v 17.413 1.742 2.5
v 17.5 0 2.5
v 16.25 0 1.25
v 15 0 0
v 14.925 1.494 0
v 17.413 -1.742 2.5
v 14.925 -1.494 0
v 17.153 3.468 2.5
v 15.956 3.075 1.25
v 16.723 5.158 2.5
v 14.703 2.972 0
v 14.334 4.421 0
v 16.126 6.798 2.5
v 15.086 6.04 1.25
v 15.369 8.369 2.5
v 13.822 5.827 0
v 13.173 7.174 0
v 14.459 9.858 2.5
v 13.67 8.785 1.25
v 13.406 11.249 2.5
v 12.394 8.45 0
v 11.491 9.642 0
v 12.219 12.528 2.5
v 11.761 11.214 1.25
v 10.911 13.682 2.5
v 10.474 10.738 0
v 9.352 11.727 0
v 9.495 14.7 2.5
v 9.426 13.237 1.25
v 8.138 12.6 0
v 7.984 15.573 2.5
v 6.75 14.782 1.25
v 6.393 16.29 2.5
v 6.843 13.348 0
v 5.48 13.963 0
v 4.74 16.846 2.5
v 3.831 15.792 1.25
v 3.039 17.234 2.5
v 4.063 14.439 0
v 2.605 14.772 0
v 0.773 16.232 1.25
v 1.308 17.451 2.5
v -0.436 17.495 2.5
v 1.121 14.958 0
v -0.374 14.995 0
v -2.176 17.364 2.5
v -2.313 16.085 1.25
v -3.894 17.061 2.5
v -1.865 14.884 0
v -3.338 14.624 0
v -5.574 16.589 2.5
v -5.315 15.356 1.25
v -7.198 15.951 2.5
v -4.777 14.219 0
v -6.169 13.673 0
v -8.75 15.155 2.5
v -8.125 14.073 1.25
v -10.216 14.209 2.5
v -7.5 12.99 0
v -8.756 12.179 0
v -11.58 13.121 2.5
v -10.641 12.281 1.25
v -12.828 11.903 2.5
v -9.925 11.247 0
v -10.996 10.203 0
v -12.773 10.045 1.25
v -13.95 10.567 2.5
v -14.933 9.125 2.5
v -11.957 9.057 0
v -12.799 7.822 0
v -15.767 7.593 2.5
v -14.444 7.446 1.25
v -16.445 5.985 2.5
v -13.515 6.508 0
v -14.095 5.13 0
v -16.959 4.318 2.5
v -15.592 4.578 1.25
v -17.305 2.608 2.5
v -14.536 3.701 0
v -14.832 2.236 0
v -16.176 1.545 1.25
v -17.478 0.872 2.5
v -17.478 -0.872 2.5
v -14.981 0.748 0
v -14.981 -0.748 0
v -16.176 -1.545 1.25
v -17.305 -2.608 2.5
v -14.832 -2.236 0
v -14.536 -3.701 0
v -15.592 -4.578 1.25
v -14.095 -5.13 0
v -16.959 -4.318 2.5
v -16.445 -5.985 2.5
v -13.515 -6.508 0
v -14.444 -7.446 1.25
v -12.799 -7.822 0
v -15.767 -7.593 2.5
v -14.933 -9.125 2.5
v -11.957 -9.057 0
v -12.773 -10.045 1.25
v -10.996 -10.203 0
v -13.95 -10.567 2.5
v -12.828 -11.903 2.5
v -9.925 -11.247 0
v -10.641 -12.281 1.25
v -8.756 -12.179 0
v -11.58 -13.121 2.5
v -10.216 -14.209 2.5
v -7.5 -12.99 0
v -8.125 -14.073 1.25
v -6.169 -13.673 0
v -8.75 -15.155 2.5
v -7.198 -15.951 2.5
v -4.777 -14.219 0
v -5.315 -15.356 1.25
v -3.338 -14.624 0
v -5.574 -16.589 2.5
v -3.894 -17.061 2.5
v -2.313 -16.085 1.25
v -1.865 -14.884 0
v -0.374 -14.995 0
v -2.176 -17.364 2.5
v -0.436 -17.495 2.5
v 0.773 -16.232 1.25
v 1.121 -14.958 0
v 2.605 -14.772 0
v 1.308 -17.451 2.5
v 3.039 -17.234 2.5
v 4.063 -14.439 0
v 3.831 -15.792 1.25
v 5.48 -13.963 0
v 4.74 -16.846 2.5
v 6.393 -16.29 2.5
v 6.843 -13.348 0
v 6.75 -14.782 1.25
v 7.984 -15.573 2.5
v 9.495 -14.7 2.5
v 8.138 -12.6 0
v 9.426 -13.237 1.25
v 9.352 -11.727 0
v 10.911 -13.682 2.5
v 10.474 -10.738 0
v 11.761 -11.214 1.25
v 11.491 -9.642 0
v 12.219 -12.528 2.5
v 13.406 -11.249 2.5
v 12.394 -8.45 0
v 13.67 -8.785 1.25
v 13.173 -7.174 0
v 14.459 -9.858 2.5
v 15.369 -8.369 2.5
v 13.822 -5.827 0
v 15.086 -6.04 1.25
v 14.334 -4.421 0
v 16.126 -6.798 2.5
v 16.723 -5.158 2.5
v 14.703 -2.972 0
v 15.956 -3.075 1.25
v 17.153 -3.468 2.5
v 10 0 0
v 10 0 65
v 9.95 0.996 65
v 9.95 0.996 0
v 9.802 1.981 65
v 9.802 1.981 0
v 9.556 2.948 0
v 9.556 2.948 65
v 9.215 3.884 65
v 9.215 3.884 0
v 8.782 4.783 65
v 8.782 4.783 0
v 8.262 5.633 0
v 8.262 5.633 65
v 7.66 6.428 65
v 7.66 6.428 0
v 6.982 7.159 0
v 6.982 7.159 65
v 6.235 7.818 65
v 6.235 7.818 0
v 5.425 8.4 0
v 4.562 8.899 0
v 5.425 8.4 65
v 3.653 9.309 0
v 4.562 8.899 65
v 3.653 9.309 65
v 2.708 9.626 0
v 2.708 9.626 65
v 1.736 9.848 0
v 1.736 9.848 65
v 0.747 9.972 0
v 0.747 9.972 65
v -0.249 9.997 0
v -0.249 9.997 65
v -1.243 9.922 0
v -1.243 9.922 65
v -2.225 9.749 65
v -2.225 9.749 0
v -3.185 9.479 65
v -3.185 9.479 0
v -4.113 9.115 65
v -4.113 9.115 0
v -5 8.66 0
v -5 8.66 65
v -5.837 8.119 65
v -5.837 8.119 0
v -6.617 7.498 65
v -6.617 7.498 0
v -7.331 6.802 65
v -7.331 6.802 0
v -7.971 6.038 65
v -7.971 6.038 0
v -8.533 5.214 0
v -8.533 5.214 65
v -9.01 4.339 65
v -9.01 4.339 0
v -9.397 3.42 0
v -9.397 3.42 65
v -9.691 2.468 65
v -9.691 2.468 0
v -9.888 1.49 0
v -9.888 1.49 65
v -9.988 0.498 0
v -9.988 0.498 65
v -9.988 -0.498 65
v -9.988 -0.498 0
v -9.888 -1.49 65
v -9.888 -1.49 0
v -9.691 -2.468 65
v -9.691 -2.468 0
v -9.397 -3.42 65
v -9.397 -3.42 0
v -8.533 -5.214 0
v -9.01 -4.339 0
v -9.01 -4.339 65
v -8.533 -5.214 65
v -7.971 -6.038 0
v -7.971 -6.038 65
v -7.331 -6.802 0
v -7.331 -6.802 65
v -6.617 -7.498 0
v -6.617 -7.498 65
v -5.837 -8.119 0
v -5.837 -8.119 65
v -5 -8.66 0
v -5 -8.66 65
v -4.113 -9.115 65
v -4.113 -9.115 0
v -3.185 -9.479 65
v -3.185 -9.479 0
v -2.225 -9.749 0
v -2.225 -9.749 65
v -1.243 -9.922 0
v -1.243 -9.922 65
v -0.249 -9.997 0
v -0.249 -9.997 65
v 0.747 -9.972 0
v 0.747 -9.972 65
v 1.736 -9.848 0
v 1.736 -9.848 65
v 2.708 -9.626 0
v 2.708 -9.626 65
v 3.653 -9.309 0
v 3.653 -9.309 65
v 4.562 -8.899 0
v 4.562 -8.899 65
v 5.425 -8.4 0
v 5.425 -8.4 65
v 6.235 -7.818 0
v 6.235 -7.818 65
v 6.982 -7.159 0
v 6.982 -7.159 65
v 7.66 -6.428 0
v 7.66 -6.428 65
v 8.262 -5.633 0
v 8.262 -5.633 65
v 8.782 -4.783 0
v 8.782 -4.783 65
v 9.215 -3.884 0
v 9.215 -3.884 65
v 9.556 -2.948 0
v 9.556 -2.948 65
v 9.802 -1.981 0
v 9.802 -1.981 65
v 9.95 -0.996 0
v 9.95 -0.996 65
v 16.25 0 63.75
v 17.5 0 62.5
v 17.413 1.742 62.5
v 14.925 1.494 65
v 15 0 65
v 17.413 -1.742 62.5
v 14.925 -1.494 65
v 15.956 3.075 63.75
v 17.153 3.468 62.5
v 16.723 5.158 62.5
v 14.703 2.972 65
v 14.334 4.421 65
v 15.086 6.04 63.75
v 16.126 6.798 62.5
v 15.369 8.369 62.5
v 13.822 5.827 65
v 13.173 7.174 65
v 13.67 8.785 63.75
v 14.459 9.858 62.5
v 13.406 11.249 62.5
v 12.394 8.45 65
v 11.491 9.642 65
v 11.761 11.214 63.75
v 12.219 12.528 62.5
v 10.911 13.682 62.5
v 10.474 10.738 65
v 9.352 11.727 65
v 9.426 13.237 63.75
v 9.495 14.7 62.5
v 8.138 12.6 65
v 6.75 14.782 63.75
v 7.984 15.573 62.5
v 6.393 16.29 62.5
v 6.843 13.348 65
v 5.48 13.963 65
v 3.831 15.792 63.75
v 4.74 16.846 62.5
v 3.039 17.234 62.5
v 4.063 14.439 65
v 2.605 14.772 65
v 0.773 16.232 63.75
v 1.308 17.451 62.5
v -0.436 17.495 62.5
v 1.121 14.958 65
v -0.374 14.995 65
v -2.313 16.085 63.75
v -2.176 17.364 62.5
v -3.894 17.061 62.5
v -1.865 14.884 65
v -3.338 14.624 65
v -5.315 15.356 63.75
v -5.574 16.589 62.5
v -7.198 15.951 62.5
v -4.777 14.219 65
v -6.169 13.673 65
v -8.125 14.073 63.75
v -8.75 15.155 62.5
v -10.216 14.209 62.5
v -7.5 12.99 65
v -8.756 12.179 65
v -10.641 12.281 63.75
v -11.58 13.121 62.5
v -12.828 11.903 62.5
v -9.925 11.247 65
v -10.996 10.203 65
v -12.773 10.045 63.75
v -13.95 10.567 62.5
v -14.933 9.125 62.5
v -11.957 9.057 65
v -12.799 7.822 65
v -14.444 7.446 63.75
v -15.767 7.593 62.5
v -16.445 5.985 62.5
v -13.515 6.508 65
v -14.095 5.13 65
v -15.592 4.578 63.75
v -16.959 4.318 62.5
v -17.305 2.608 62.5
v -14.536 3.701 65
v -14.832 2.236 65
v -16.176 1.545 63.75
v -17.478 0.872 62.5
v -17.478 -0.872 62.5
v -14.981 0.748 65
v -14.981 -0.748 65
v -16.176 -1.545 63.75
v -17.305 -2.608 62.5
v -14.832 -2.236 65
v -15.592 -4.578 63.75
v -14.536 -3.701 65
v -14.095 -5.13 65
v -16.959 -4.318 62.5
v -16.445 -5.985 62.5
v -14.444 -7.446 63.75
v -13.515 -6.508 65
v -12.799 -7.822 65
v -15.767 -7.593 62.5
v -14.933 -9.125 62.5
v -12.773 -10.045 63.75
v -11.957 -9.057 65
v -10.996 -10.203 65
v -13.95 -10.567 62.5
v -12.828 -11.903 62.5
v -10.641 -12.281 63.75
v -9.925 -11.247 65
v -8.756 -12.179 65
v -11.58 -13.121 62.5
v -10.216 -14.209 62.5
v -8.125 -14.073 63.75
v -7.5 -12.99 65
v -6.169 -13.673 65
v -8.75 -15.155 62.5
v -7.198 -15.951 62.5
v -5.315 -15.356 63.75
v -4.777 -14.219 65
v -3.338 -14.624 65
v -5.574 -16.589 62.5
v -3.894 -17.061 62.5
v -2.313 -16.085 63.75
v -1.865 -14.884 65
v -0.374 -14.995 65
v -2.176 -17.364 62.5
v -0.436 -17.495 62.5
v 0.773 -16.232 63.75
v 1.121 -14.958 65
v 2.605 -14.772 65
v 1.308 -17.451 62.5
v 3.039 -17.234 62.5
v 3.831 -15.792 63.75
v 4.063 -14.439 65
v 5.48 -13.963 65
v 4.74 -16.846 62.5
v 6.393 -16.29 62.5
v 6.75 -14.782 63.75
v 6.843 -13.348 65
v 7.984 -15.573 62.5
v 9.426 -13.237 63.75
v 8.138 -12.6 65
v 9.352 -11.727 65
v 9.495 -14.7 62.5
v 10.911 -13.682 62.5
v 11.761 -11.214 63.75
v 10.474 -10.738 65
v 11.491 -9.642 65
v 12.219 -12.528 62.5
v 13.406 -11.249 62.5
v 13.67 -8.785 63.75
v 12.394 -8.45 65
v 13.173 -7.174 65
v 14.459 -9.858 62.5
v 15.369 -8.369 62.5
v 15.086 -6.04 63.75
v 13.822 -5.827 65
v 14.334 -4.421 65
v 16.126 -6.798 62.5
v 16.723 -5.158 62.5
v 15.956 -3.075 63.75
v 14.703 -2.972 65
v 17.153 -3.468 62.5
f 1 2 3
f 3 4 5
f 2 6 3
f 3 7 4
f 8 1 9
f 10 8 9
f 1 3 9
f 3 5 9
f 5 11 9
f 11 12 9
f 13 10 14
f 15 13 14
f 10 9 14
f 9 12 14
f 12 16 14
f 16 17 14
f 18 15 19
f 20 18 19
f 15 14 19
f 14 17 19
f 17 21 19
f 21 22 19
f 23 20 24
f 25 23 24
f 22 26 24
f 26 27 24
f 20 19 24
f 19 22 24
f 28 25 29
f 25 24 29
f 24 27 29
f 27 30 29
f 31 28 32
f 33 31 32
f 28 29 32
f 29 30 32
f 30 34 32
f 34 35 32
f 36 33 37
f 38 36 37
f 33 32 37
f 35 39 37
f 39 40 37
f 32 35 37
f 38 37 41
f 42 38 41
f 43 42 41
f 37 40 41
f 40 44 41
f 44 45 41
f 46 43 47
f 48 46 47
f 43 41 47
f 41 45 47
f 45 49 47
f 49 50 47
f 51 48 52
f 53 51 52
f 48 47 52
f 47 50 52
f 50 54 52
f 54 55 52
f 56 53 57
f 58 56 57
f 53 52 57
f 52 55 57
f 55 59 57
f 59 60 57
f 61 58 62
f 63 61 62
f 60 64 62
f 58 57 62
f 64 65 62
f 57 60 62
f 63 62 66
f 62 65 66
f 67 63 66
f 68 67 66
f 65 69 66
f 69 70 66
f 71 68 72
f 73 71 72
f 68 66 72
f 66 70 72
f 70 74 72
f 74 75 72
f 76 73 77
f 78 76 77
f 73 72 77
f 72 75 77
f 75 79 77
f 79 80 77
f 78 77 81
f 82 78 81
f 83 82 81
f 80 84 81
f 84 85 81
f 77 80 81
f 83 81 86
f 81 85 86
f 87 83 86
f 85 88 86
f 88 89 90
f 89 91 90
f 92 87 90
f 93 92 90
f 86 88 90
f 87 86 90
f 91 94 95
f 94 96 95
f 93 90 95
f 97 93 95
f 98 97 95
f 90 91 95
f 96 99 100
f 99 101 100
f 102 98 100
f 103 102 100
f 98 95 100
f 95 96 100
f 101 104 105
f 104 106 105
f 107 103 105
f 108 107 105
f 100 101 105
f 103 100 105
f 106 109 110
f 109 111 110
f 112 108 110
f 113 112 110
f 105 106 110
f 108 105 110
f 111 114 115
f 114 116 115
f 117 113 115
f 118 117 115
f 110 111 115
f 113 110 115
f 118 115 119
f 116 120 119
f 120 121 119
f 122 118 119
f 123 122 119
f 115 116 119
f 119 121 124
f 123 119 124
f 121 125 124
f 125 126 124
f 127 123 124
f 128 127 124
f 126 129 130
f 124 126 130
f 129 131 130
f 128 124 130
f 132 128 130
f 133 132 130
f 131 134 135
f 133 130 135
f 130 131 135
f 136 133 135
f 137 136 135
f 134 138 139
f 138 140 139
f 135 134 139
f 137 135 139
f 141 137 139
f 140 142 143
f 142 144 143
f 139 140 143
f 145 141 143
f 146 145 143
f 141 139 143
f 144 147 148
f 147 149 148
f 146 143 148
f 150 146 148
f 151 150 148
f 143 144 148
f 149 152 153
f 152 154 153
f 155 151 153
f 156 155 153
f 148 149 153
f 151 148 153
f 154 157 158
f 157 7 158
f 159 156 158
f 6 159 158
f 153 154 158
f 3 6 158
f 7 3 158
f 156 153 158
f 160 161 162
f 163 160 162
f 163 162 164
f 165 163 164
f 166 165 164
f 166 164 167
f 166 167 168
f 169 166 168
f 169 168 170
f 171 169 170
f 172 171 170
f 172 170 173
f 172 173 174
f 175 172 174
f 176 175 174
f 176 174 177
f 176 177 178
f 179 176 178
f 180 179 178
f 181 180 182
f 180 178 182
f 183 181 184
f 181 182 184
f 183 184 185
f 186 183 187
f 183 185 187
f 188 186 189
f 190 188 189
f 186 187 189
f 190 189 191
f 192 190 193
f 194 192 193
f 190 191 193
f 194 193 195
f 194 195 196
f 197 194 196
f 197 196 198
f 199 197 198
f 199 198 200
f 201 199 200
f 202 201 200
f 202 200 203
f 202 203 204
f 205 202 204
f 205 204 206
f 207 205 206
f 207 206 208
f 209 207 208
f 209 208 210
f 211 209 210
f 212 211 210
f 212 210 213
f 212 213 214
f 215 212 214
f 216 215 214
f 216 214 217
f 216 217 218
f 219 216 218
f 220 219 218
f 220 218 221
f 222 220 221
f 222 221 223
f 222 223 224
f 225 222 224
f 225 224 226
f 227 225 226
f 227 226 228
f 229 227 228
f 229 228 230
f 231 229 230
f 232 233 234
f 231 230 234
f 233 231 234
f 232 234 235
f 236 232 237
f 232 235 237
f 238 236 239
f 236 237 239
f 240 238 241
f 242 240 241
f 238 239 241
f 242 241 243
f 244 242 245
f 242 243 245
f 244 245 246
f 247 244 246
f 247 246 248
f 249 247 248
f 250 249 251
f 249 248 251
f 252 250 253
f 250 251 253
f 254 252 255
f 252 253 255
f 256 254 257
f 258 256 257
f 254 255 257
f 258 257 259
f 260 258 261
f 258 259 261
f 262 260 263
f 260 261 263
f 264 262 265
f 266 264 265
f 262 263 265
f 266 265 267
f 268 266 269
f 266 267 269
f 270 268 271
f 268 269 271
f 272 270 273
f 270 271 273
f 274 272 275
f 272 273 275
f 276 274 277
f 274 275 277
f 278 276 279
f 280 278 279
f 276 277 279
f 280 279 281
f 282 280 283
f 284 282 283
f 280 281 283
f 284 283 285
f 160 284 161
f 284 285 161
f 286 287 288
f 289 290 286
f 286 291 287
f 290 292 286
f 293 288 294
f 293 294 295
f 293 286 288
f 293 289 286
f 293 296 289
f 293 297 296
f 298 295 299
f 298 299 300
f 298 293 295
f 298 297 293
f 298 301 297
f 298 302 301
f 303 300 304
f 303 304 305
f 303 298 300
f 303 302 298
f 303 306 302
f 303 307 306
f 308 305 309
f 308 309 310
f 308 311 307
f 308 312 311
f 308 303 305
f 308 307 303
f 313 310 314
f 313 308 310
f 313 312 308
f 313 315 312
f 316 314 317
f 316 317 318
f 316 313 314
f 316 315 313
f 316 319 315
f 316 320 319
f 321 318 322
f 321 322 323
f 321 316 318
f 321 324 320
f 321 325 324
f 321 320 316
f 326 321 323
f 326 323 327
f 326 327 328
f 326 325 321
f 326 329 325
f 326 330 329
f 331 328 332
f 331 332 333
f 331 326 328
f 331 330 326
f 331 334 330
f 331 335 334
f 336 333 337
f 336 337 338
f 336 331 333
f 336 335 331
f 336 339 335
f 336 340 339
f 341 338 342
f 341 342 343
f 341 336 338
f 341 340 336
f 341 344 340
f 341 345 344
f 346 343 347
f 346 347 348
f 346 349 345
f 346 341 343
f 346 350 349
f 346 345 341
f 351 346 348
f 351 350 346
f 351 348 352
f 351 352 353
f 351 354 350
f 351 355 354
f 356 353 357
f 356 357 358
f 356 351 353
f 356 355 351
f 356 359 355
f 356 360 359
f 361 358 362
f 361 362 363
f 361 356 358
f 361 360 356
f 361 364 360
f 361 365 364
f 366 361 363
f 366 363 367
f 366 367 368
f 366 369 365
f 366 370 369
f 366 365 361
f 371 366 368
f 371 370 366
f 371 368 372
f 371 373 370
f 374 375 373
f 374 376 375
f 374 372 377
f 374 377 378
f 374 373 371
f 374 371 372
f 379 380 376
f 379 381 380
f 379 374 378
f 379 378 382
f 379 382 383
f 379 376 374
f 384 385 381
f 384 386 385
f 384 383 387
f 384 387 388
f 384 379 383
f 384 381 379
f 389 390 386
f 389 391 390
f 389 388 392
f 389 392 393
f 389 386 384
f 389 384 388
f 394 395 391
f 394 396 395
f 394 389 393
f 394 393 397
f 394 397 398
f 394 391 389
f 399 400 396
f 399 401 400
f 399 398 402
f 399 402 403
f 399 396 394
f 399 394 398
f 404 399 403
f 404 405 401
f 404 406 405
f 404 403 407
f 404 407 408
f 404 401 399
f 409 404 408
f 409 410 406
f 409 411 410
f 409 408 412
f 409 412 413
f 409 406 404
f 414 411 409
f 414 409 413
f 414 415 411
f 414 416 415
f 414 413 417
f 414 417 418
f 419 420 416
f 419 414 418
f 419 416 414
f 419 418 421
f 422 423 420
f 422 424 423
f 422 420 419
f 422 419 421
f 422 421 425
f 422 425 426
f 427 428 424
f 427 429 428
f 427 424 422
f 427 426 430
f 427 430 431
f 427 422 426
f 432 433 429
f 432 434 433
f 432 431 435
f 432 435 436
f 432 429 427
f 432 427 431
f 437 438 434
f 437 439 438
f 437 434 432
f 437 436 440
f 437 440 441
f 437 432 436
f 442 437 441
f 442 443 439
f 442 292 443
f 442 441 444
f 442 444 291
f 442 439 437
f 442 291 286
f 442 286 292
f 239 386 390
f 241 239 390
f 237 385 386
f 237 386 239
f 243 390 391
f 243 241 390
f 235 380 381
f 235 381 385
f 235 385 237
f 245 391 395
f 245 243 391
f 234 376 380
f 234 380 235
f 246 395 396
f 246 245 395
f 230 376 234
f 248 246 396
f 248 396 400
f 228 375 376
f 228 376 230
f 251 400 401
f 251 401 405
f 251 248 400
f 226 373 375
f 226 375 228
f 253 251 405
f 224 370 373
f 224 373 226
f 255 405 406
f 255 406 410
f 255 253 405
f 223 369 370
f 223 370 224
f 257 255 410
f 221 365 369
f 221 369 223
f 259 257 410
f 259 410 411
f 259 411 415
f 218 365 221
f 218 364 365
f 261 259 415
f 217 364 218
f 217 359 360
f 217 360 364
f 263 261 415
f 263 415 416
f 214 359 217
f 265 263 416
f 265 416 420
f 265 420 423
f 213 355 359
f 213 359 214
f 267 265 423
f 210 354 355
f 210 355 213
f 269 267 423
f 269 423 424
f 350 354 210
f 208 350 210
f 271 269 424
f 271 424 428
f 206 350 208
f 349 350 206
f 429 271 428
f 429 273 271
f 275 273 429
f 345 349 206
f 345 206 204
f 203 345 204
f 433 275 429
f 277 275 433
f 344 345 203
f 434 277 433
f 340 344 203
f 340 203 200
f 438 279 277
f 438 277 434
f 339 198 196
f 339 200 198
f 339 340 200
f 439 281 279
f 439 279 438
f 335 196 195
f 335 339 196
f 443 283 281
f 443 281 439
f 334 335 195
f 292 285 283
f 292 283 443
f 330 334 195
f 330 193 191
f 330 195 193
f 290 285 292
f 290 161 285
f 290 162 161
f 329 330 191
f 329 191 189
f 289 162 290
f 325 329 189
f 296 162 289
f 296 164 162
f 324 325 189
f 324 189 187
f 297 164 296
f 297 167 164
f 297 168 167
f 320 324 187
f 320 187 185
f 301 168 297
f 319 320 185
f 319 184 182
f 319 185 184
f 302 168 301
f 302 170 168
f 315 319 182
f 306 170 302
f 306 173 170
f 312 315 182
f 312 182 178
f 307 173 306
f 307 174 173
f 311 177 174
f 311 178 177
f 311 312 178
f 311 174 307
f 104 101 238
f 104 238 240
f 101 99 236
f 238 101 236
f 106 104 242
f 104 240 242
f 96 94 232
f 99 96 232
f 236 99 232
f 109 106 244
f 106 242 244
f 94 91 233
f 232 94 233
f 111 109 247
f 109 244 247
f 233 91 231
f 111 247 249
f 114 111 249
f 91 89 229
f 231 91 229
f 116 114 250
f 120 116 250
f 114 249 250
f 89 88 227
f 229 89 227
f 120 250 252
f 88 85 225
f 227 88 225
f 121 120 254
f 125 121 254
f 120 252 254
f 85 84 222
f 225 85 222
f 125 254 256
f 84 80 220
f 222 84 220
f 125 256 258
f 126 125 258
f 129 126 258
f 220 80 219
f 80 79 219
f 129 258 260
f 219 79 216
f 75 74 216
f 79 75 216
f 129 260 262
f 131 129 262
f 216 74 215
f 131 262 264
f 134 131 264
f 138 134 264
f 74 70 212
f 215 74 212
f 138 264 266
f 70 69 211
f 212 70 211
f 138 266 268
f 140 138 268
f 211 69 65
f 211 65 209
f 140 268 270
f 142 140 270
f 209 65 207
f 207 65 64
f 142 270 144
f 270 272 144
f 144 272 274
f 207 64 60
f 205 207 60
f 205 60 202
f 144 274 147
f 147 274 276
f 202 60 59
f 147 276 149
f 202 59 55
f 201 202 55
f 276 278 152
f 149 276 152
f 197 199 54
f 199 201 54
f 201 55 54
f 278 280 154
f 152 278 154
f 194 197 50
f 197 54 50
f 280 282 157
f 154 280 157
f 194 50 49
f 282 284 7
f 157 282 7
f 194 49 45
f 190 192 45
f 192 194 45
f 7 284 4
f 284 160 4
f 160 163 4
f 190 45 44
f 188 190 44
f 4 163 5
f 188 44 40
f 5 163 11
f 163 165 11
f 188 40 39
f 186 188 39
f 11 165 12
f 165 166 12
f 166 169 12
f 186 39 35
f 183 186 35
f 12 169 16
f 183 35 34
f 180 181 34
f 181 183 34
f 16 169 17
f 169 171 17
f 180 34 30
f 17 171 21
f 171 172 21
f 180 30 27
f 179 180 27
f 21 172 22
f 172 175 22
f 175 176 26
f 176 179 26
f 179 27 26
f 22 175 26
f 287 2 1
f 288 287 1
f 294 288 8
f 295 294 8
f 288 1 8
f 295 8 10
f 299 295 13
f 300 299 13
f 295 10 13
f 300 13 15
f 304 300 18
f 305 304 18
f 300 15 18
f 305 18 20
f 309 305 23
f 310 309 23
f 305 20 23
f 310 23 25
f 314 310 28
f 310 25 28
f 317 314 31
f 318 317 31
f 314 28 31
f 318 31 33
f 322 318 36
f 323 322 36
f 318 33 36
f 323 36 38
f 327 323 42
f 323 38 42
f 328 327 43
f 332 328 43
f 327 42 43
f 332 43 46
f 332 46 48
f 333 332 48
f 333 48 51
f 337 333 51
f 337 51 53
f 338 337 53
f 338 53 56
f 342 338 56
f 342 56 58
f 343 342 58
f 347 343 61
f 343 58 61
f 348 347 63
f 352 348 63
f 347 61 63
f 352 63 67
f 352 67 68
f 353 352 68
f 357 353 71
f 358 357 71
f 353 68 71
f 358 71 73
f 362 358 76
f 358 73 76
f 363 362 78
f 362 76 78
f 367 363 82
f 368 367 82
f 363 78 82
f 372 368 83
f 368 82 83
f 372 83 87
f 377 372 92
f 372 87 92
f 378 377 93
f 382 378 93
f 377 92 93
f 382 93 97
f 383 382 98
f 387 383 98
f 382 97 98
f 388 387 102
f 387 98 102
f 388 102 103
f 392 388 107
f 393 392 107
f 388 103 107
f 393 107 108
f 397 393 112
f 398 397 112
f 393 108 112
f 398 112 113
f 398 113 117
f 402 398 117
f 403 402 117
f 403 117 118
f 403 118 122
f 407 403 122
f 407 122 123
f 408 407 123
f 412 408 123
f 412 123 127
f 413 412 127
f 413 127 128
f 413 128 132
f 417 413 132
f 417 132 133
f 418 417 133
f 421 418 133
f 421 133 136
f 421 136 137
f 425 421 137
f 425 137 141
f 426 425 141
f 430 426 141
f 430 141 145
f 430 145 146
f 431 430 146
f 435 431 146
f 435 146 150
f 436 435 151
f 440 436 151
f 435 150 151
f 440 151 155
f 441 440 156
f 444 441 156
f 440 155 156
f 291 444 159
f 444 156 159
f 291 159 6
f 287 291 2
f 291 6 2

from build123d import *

# Parameters (mm, degrees)
SKETCH1_R               = 17.5
BOSS_EXTRUDE1_DEPTH     = 65
SKETCH2_R               = 10
CUT_EXTRUDE1_DEPTH      = 1
CUT_EXTRUDE1_DEPTH_BACK = 66
CHAMFER1_SIZE           = 2.5


with BuildPart() as part:
    # Sketch1 → Boss-Extrude1 (new body)
    with BuildSketch(Plane.XY):
        Circle(SKETCH1_R)
    extrude(amount=BOSS_EXTRUDE1_DEPTH)

    # Sketch2 → Cut-Extrude1 (cut, two sides)
    with BuildSketch(Plane.XY.offset(65)) as cut_extrude1_sk:
        Circle(SKETCH2_R)
    extrude(amount=CUT_EXTRUDE1_DEPTH, mode=Mode.SUBTRACT)
    extrude(cut_extrude1_sk.sketch, amount=-CUT_EXTRUDE1_DEPTH_BACK, mode=Mode.SUBTRACT)

    # Chamfer1
    chamfer1_edges = [part.edges().sort_by_distance(p)[0] for p in [
        (-17.5, 0, 0),
        (-17.5, 0, 65),
    ]]
    chamfer(chamfer1_edges, length=CHAMFER1_SIZE)


solid = part.part
